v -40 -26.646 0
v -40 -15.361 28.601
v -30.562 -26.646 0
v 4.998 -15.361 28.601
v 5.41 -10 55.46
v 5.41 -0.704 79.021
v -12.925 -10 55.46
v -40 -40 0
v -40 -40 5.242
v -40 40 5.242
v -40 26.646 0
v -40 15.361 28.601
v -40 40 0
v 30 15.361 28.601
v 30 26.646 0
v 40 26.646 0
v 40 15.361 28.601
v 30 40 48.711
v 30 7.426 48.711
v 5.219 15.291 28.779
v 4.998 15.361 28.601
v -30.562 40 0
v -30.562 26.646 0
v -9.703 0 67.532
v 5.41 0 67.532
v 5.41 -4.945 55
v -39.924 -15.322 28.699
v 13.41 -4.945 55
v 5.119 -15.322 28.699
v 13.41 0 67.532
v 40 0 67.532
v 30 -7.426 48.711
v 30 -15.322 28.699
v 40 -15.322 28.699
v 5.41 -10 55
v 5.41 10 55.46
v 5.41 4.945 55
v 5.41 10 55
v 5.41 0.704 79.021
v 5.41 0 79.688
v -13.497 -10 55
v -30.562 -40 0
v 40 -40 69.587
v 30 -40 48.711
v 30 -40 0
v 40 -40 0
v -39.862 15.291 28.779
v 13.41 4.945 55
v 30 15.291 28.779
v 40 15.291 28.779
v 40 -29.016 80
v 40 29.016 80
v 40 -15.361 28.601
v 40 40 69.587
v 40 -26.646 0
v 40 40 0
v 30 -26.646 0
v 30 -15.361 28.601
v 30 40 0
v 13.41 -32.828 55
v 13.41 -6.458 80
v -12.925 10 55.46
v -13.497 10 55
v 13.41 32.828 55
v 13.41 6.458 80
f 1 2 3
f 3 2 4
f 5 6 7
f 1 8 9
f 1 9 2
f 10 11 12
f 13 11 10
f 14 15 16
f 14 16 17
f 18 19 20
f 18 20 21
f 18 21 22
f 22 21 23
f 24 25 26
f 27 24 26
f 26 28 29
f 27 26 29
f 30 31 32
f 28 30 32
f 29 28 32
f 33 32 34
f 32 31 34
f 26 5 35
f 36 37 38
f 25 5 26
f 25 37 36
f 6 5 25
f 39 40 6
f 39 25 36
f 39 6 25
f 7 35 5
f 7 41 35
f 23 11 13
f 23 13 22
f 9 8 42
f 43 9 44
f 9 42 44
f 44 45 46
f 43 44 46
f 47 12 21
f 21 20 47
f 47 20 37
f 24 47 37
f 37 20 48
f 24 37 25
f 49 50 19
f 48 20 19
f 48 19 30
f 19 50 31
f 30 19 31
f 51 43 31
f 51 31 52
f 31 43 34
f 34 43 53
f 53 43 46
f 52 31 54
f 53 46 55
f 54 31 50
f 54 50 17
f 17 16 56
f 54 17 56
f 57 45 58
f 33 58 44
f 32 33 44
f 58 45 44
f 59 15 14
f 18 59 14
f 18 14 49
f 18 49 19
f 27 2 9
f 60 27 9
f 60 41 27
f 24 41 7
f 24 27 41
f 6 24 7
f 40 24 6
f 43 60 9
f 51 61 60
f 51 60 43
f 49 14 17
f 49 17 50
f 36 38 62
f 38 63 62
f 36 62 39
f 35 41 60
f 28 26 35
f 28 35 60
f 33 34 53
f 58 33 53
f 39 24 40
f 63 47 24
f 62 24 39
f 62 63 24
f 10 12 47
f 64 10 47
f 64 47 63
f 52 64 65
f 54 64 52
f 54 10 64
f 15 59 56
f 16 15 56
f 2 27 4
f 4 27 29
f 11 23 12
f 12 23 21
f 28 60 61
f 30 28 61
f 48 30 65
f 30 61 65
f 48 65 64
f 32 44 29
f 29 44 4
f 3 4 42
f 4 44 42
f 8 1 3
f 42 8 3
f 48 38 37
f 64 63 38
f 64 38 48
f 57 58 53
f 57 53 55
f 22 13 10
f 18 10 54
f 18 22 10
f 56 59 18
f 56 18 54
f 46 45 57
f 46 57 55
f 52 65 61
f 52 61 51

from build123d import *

# Parameters (mm, degrees)
F0_W           = 80
F0_H           = 80
F1_DEPTH       = 80
F3_DEPTH       = 86.9
F4_W           = 8
F4_H           = 80
F5_DEPTH       = 25
F6_W           = 30
F6_H           = 25
F7_DEPTH       = 25
F9_DEPTH       = 50.3
F11_W          = 223.7579002976
F11_H          = 231.868326664
F12_DEPTH      = 25
F13_W          = 207.2095647454
F13_H          = 262.1310725808
F14_DEPTH      = 25
F16_DEPTH      = 127.5
F18_DEPTH      = 40.001
F18_DEPTH_BACK = 40.001


# Not quite as in the source:
# - a feature of the source that left no trace in its solid (it failed there, or was rolled back) is left out


with BuildPart() as f1:
    # F0 (on Top) → F1 (new body)
    with BuildSketch(Plane.XY):
        Rectangle(F0_W, F0_H)
    extrude(amount=F1_DEPTH)

    # F2 (on face) → F3 (cut)
    with BuildSketch(Plane.XZ.offset(40)):
        Polygon((-40, 28.6014117301), (0, 80), (-40, 80), align=None)
    extrude(amount=-F3_DEPTH, mode=Mode.SUBTRACT)

    # F4 (on face) → F5 (cut)
    with BuildSketch(Plane.XY.offset(80)):
        with Locations((9.4103766605, 0)):
            Rectangle(F4_W, F4_H)
    extrude(amount=-F5_DEPTH, mode=Mode.SUBTRACT)

    # F6 (on face) → F7 (cut)
    with BuildSketch(Plane.YZ.offset(5.4103766605)):
        with Locations((-25, 67.5)):
            Rectangle(F6_W, F6_H)
        with Locations((25, 67.5)):
            Rectangle(F6_W, F6_H)
    extrude(amount=-F7_DEPTH, mode=Mode.SUBTRACT)

    # F8 (on face) → F9 (cut)
    with BuildSketch(Plane(origin=(-40, 0, 0), x_dir=(0, -1, 0), z_dir=(-1, 0, 0))):
        Polygon((-10.1708276197, 55.0271123648), (0, 80.8042436838), (10.1708276197, 55.0271123648), (61.0520653427, 55.0271123648), (61.0520653427, 88.9606252313), (0, 88.9606252313), (-61.0520653427, 88.9606252313), (-61.0520653427, 55.0271123648), align=None)
    extrude(amount=-F9_DEPTH, mode=Mode.SUBTRACT)

    # F11 (on face) → F12 (cut)
    with BuildSketch(Plane(origin=(-23.8023577799, -28.0559598365, 29.5937245096), x_dir=(0.8636441264, -0.3468224195, 0.3658319728), z_dir=(-0.5041019966, -0.5941875801, 0.6267553723))):
        with Locations((27.8940685093, 6.7206919193)):
            Rectangle(F11_W, F11_H)
    extrude(amount=F12_DEPTH, mode=Mode.SUBTRACT)

    # F13 (on face) → F14 (cut)
    with BuildSketch(Plane(origin=(-23.8023577799, 28.0559598365, 29.5937245096), x_dir=(0.8636441264, 0.3468224195, 0.3658319728), z_dir=(-0.5041019966, 0.5941875801, 0.6267553723))):
        with Locations((8.8918171823, -6.4797215164)):
            Rectangle(F13_W, F13_H)
    extrude(amount=F14_DEPTH, mode=Mode.SUBTRACT)

    # F15 (on face) → F16 (cut)
    with BuildSketch(Plane.XZ.offset(40)):
        Polygon((30, 0), (30, 48.7106099482), (-30.5624192708, 0), align=None)
    extrude(amount=-F16_DEPTH, mode=Mode.SUBTRACT)

    # F17 (on Right) → F18 (cut, two sides)
    with BuildSketch(Plane.YZ) as f18_sk:
        Polygon((15.2906342708, 28.7791552365), (0, 67.5320180601), (-15.3222406511, 28.6990514489), (-15.3607661463, 28.6014117301), (15.3607661463, 28.6014117301), align=None)
        Polygon((26.6459640524, 0), (15.3607661463, 28.6014117301), (-15.3607661463, 28.6014117301), (-26.6459640524, 0), align=None)
    extrude(amount=-F18_DEPTH, mode=Mode.SUBTRACT)
    extrude(f18_sk.sketch, amount=F18_DEPTH_BACK, mode=Mode.SUBTRACT)


solid = f1.part
